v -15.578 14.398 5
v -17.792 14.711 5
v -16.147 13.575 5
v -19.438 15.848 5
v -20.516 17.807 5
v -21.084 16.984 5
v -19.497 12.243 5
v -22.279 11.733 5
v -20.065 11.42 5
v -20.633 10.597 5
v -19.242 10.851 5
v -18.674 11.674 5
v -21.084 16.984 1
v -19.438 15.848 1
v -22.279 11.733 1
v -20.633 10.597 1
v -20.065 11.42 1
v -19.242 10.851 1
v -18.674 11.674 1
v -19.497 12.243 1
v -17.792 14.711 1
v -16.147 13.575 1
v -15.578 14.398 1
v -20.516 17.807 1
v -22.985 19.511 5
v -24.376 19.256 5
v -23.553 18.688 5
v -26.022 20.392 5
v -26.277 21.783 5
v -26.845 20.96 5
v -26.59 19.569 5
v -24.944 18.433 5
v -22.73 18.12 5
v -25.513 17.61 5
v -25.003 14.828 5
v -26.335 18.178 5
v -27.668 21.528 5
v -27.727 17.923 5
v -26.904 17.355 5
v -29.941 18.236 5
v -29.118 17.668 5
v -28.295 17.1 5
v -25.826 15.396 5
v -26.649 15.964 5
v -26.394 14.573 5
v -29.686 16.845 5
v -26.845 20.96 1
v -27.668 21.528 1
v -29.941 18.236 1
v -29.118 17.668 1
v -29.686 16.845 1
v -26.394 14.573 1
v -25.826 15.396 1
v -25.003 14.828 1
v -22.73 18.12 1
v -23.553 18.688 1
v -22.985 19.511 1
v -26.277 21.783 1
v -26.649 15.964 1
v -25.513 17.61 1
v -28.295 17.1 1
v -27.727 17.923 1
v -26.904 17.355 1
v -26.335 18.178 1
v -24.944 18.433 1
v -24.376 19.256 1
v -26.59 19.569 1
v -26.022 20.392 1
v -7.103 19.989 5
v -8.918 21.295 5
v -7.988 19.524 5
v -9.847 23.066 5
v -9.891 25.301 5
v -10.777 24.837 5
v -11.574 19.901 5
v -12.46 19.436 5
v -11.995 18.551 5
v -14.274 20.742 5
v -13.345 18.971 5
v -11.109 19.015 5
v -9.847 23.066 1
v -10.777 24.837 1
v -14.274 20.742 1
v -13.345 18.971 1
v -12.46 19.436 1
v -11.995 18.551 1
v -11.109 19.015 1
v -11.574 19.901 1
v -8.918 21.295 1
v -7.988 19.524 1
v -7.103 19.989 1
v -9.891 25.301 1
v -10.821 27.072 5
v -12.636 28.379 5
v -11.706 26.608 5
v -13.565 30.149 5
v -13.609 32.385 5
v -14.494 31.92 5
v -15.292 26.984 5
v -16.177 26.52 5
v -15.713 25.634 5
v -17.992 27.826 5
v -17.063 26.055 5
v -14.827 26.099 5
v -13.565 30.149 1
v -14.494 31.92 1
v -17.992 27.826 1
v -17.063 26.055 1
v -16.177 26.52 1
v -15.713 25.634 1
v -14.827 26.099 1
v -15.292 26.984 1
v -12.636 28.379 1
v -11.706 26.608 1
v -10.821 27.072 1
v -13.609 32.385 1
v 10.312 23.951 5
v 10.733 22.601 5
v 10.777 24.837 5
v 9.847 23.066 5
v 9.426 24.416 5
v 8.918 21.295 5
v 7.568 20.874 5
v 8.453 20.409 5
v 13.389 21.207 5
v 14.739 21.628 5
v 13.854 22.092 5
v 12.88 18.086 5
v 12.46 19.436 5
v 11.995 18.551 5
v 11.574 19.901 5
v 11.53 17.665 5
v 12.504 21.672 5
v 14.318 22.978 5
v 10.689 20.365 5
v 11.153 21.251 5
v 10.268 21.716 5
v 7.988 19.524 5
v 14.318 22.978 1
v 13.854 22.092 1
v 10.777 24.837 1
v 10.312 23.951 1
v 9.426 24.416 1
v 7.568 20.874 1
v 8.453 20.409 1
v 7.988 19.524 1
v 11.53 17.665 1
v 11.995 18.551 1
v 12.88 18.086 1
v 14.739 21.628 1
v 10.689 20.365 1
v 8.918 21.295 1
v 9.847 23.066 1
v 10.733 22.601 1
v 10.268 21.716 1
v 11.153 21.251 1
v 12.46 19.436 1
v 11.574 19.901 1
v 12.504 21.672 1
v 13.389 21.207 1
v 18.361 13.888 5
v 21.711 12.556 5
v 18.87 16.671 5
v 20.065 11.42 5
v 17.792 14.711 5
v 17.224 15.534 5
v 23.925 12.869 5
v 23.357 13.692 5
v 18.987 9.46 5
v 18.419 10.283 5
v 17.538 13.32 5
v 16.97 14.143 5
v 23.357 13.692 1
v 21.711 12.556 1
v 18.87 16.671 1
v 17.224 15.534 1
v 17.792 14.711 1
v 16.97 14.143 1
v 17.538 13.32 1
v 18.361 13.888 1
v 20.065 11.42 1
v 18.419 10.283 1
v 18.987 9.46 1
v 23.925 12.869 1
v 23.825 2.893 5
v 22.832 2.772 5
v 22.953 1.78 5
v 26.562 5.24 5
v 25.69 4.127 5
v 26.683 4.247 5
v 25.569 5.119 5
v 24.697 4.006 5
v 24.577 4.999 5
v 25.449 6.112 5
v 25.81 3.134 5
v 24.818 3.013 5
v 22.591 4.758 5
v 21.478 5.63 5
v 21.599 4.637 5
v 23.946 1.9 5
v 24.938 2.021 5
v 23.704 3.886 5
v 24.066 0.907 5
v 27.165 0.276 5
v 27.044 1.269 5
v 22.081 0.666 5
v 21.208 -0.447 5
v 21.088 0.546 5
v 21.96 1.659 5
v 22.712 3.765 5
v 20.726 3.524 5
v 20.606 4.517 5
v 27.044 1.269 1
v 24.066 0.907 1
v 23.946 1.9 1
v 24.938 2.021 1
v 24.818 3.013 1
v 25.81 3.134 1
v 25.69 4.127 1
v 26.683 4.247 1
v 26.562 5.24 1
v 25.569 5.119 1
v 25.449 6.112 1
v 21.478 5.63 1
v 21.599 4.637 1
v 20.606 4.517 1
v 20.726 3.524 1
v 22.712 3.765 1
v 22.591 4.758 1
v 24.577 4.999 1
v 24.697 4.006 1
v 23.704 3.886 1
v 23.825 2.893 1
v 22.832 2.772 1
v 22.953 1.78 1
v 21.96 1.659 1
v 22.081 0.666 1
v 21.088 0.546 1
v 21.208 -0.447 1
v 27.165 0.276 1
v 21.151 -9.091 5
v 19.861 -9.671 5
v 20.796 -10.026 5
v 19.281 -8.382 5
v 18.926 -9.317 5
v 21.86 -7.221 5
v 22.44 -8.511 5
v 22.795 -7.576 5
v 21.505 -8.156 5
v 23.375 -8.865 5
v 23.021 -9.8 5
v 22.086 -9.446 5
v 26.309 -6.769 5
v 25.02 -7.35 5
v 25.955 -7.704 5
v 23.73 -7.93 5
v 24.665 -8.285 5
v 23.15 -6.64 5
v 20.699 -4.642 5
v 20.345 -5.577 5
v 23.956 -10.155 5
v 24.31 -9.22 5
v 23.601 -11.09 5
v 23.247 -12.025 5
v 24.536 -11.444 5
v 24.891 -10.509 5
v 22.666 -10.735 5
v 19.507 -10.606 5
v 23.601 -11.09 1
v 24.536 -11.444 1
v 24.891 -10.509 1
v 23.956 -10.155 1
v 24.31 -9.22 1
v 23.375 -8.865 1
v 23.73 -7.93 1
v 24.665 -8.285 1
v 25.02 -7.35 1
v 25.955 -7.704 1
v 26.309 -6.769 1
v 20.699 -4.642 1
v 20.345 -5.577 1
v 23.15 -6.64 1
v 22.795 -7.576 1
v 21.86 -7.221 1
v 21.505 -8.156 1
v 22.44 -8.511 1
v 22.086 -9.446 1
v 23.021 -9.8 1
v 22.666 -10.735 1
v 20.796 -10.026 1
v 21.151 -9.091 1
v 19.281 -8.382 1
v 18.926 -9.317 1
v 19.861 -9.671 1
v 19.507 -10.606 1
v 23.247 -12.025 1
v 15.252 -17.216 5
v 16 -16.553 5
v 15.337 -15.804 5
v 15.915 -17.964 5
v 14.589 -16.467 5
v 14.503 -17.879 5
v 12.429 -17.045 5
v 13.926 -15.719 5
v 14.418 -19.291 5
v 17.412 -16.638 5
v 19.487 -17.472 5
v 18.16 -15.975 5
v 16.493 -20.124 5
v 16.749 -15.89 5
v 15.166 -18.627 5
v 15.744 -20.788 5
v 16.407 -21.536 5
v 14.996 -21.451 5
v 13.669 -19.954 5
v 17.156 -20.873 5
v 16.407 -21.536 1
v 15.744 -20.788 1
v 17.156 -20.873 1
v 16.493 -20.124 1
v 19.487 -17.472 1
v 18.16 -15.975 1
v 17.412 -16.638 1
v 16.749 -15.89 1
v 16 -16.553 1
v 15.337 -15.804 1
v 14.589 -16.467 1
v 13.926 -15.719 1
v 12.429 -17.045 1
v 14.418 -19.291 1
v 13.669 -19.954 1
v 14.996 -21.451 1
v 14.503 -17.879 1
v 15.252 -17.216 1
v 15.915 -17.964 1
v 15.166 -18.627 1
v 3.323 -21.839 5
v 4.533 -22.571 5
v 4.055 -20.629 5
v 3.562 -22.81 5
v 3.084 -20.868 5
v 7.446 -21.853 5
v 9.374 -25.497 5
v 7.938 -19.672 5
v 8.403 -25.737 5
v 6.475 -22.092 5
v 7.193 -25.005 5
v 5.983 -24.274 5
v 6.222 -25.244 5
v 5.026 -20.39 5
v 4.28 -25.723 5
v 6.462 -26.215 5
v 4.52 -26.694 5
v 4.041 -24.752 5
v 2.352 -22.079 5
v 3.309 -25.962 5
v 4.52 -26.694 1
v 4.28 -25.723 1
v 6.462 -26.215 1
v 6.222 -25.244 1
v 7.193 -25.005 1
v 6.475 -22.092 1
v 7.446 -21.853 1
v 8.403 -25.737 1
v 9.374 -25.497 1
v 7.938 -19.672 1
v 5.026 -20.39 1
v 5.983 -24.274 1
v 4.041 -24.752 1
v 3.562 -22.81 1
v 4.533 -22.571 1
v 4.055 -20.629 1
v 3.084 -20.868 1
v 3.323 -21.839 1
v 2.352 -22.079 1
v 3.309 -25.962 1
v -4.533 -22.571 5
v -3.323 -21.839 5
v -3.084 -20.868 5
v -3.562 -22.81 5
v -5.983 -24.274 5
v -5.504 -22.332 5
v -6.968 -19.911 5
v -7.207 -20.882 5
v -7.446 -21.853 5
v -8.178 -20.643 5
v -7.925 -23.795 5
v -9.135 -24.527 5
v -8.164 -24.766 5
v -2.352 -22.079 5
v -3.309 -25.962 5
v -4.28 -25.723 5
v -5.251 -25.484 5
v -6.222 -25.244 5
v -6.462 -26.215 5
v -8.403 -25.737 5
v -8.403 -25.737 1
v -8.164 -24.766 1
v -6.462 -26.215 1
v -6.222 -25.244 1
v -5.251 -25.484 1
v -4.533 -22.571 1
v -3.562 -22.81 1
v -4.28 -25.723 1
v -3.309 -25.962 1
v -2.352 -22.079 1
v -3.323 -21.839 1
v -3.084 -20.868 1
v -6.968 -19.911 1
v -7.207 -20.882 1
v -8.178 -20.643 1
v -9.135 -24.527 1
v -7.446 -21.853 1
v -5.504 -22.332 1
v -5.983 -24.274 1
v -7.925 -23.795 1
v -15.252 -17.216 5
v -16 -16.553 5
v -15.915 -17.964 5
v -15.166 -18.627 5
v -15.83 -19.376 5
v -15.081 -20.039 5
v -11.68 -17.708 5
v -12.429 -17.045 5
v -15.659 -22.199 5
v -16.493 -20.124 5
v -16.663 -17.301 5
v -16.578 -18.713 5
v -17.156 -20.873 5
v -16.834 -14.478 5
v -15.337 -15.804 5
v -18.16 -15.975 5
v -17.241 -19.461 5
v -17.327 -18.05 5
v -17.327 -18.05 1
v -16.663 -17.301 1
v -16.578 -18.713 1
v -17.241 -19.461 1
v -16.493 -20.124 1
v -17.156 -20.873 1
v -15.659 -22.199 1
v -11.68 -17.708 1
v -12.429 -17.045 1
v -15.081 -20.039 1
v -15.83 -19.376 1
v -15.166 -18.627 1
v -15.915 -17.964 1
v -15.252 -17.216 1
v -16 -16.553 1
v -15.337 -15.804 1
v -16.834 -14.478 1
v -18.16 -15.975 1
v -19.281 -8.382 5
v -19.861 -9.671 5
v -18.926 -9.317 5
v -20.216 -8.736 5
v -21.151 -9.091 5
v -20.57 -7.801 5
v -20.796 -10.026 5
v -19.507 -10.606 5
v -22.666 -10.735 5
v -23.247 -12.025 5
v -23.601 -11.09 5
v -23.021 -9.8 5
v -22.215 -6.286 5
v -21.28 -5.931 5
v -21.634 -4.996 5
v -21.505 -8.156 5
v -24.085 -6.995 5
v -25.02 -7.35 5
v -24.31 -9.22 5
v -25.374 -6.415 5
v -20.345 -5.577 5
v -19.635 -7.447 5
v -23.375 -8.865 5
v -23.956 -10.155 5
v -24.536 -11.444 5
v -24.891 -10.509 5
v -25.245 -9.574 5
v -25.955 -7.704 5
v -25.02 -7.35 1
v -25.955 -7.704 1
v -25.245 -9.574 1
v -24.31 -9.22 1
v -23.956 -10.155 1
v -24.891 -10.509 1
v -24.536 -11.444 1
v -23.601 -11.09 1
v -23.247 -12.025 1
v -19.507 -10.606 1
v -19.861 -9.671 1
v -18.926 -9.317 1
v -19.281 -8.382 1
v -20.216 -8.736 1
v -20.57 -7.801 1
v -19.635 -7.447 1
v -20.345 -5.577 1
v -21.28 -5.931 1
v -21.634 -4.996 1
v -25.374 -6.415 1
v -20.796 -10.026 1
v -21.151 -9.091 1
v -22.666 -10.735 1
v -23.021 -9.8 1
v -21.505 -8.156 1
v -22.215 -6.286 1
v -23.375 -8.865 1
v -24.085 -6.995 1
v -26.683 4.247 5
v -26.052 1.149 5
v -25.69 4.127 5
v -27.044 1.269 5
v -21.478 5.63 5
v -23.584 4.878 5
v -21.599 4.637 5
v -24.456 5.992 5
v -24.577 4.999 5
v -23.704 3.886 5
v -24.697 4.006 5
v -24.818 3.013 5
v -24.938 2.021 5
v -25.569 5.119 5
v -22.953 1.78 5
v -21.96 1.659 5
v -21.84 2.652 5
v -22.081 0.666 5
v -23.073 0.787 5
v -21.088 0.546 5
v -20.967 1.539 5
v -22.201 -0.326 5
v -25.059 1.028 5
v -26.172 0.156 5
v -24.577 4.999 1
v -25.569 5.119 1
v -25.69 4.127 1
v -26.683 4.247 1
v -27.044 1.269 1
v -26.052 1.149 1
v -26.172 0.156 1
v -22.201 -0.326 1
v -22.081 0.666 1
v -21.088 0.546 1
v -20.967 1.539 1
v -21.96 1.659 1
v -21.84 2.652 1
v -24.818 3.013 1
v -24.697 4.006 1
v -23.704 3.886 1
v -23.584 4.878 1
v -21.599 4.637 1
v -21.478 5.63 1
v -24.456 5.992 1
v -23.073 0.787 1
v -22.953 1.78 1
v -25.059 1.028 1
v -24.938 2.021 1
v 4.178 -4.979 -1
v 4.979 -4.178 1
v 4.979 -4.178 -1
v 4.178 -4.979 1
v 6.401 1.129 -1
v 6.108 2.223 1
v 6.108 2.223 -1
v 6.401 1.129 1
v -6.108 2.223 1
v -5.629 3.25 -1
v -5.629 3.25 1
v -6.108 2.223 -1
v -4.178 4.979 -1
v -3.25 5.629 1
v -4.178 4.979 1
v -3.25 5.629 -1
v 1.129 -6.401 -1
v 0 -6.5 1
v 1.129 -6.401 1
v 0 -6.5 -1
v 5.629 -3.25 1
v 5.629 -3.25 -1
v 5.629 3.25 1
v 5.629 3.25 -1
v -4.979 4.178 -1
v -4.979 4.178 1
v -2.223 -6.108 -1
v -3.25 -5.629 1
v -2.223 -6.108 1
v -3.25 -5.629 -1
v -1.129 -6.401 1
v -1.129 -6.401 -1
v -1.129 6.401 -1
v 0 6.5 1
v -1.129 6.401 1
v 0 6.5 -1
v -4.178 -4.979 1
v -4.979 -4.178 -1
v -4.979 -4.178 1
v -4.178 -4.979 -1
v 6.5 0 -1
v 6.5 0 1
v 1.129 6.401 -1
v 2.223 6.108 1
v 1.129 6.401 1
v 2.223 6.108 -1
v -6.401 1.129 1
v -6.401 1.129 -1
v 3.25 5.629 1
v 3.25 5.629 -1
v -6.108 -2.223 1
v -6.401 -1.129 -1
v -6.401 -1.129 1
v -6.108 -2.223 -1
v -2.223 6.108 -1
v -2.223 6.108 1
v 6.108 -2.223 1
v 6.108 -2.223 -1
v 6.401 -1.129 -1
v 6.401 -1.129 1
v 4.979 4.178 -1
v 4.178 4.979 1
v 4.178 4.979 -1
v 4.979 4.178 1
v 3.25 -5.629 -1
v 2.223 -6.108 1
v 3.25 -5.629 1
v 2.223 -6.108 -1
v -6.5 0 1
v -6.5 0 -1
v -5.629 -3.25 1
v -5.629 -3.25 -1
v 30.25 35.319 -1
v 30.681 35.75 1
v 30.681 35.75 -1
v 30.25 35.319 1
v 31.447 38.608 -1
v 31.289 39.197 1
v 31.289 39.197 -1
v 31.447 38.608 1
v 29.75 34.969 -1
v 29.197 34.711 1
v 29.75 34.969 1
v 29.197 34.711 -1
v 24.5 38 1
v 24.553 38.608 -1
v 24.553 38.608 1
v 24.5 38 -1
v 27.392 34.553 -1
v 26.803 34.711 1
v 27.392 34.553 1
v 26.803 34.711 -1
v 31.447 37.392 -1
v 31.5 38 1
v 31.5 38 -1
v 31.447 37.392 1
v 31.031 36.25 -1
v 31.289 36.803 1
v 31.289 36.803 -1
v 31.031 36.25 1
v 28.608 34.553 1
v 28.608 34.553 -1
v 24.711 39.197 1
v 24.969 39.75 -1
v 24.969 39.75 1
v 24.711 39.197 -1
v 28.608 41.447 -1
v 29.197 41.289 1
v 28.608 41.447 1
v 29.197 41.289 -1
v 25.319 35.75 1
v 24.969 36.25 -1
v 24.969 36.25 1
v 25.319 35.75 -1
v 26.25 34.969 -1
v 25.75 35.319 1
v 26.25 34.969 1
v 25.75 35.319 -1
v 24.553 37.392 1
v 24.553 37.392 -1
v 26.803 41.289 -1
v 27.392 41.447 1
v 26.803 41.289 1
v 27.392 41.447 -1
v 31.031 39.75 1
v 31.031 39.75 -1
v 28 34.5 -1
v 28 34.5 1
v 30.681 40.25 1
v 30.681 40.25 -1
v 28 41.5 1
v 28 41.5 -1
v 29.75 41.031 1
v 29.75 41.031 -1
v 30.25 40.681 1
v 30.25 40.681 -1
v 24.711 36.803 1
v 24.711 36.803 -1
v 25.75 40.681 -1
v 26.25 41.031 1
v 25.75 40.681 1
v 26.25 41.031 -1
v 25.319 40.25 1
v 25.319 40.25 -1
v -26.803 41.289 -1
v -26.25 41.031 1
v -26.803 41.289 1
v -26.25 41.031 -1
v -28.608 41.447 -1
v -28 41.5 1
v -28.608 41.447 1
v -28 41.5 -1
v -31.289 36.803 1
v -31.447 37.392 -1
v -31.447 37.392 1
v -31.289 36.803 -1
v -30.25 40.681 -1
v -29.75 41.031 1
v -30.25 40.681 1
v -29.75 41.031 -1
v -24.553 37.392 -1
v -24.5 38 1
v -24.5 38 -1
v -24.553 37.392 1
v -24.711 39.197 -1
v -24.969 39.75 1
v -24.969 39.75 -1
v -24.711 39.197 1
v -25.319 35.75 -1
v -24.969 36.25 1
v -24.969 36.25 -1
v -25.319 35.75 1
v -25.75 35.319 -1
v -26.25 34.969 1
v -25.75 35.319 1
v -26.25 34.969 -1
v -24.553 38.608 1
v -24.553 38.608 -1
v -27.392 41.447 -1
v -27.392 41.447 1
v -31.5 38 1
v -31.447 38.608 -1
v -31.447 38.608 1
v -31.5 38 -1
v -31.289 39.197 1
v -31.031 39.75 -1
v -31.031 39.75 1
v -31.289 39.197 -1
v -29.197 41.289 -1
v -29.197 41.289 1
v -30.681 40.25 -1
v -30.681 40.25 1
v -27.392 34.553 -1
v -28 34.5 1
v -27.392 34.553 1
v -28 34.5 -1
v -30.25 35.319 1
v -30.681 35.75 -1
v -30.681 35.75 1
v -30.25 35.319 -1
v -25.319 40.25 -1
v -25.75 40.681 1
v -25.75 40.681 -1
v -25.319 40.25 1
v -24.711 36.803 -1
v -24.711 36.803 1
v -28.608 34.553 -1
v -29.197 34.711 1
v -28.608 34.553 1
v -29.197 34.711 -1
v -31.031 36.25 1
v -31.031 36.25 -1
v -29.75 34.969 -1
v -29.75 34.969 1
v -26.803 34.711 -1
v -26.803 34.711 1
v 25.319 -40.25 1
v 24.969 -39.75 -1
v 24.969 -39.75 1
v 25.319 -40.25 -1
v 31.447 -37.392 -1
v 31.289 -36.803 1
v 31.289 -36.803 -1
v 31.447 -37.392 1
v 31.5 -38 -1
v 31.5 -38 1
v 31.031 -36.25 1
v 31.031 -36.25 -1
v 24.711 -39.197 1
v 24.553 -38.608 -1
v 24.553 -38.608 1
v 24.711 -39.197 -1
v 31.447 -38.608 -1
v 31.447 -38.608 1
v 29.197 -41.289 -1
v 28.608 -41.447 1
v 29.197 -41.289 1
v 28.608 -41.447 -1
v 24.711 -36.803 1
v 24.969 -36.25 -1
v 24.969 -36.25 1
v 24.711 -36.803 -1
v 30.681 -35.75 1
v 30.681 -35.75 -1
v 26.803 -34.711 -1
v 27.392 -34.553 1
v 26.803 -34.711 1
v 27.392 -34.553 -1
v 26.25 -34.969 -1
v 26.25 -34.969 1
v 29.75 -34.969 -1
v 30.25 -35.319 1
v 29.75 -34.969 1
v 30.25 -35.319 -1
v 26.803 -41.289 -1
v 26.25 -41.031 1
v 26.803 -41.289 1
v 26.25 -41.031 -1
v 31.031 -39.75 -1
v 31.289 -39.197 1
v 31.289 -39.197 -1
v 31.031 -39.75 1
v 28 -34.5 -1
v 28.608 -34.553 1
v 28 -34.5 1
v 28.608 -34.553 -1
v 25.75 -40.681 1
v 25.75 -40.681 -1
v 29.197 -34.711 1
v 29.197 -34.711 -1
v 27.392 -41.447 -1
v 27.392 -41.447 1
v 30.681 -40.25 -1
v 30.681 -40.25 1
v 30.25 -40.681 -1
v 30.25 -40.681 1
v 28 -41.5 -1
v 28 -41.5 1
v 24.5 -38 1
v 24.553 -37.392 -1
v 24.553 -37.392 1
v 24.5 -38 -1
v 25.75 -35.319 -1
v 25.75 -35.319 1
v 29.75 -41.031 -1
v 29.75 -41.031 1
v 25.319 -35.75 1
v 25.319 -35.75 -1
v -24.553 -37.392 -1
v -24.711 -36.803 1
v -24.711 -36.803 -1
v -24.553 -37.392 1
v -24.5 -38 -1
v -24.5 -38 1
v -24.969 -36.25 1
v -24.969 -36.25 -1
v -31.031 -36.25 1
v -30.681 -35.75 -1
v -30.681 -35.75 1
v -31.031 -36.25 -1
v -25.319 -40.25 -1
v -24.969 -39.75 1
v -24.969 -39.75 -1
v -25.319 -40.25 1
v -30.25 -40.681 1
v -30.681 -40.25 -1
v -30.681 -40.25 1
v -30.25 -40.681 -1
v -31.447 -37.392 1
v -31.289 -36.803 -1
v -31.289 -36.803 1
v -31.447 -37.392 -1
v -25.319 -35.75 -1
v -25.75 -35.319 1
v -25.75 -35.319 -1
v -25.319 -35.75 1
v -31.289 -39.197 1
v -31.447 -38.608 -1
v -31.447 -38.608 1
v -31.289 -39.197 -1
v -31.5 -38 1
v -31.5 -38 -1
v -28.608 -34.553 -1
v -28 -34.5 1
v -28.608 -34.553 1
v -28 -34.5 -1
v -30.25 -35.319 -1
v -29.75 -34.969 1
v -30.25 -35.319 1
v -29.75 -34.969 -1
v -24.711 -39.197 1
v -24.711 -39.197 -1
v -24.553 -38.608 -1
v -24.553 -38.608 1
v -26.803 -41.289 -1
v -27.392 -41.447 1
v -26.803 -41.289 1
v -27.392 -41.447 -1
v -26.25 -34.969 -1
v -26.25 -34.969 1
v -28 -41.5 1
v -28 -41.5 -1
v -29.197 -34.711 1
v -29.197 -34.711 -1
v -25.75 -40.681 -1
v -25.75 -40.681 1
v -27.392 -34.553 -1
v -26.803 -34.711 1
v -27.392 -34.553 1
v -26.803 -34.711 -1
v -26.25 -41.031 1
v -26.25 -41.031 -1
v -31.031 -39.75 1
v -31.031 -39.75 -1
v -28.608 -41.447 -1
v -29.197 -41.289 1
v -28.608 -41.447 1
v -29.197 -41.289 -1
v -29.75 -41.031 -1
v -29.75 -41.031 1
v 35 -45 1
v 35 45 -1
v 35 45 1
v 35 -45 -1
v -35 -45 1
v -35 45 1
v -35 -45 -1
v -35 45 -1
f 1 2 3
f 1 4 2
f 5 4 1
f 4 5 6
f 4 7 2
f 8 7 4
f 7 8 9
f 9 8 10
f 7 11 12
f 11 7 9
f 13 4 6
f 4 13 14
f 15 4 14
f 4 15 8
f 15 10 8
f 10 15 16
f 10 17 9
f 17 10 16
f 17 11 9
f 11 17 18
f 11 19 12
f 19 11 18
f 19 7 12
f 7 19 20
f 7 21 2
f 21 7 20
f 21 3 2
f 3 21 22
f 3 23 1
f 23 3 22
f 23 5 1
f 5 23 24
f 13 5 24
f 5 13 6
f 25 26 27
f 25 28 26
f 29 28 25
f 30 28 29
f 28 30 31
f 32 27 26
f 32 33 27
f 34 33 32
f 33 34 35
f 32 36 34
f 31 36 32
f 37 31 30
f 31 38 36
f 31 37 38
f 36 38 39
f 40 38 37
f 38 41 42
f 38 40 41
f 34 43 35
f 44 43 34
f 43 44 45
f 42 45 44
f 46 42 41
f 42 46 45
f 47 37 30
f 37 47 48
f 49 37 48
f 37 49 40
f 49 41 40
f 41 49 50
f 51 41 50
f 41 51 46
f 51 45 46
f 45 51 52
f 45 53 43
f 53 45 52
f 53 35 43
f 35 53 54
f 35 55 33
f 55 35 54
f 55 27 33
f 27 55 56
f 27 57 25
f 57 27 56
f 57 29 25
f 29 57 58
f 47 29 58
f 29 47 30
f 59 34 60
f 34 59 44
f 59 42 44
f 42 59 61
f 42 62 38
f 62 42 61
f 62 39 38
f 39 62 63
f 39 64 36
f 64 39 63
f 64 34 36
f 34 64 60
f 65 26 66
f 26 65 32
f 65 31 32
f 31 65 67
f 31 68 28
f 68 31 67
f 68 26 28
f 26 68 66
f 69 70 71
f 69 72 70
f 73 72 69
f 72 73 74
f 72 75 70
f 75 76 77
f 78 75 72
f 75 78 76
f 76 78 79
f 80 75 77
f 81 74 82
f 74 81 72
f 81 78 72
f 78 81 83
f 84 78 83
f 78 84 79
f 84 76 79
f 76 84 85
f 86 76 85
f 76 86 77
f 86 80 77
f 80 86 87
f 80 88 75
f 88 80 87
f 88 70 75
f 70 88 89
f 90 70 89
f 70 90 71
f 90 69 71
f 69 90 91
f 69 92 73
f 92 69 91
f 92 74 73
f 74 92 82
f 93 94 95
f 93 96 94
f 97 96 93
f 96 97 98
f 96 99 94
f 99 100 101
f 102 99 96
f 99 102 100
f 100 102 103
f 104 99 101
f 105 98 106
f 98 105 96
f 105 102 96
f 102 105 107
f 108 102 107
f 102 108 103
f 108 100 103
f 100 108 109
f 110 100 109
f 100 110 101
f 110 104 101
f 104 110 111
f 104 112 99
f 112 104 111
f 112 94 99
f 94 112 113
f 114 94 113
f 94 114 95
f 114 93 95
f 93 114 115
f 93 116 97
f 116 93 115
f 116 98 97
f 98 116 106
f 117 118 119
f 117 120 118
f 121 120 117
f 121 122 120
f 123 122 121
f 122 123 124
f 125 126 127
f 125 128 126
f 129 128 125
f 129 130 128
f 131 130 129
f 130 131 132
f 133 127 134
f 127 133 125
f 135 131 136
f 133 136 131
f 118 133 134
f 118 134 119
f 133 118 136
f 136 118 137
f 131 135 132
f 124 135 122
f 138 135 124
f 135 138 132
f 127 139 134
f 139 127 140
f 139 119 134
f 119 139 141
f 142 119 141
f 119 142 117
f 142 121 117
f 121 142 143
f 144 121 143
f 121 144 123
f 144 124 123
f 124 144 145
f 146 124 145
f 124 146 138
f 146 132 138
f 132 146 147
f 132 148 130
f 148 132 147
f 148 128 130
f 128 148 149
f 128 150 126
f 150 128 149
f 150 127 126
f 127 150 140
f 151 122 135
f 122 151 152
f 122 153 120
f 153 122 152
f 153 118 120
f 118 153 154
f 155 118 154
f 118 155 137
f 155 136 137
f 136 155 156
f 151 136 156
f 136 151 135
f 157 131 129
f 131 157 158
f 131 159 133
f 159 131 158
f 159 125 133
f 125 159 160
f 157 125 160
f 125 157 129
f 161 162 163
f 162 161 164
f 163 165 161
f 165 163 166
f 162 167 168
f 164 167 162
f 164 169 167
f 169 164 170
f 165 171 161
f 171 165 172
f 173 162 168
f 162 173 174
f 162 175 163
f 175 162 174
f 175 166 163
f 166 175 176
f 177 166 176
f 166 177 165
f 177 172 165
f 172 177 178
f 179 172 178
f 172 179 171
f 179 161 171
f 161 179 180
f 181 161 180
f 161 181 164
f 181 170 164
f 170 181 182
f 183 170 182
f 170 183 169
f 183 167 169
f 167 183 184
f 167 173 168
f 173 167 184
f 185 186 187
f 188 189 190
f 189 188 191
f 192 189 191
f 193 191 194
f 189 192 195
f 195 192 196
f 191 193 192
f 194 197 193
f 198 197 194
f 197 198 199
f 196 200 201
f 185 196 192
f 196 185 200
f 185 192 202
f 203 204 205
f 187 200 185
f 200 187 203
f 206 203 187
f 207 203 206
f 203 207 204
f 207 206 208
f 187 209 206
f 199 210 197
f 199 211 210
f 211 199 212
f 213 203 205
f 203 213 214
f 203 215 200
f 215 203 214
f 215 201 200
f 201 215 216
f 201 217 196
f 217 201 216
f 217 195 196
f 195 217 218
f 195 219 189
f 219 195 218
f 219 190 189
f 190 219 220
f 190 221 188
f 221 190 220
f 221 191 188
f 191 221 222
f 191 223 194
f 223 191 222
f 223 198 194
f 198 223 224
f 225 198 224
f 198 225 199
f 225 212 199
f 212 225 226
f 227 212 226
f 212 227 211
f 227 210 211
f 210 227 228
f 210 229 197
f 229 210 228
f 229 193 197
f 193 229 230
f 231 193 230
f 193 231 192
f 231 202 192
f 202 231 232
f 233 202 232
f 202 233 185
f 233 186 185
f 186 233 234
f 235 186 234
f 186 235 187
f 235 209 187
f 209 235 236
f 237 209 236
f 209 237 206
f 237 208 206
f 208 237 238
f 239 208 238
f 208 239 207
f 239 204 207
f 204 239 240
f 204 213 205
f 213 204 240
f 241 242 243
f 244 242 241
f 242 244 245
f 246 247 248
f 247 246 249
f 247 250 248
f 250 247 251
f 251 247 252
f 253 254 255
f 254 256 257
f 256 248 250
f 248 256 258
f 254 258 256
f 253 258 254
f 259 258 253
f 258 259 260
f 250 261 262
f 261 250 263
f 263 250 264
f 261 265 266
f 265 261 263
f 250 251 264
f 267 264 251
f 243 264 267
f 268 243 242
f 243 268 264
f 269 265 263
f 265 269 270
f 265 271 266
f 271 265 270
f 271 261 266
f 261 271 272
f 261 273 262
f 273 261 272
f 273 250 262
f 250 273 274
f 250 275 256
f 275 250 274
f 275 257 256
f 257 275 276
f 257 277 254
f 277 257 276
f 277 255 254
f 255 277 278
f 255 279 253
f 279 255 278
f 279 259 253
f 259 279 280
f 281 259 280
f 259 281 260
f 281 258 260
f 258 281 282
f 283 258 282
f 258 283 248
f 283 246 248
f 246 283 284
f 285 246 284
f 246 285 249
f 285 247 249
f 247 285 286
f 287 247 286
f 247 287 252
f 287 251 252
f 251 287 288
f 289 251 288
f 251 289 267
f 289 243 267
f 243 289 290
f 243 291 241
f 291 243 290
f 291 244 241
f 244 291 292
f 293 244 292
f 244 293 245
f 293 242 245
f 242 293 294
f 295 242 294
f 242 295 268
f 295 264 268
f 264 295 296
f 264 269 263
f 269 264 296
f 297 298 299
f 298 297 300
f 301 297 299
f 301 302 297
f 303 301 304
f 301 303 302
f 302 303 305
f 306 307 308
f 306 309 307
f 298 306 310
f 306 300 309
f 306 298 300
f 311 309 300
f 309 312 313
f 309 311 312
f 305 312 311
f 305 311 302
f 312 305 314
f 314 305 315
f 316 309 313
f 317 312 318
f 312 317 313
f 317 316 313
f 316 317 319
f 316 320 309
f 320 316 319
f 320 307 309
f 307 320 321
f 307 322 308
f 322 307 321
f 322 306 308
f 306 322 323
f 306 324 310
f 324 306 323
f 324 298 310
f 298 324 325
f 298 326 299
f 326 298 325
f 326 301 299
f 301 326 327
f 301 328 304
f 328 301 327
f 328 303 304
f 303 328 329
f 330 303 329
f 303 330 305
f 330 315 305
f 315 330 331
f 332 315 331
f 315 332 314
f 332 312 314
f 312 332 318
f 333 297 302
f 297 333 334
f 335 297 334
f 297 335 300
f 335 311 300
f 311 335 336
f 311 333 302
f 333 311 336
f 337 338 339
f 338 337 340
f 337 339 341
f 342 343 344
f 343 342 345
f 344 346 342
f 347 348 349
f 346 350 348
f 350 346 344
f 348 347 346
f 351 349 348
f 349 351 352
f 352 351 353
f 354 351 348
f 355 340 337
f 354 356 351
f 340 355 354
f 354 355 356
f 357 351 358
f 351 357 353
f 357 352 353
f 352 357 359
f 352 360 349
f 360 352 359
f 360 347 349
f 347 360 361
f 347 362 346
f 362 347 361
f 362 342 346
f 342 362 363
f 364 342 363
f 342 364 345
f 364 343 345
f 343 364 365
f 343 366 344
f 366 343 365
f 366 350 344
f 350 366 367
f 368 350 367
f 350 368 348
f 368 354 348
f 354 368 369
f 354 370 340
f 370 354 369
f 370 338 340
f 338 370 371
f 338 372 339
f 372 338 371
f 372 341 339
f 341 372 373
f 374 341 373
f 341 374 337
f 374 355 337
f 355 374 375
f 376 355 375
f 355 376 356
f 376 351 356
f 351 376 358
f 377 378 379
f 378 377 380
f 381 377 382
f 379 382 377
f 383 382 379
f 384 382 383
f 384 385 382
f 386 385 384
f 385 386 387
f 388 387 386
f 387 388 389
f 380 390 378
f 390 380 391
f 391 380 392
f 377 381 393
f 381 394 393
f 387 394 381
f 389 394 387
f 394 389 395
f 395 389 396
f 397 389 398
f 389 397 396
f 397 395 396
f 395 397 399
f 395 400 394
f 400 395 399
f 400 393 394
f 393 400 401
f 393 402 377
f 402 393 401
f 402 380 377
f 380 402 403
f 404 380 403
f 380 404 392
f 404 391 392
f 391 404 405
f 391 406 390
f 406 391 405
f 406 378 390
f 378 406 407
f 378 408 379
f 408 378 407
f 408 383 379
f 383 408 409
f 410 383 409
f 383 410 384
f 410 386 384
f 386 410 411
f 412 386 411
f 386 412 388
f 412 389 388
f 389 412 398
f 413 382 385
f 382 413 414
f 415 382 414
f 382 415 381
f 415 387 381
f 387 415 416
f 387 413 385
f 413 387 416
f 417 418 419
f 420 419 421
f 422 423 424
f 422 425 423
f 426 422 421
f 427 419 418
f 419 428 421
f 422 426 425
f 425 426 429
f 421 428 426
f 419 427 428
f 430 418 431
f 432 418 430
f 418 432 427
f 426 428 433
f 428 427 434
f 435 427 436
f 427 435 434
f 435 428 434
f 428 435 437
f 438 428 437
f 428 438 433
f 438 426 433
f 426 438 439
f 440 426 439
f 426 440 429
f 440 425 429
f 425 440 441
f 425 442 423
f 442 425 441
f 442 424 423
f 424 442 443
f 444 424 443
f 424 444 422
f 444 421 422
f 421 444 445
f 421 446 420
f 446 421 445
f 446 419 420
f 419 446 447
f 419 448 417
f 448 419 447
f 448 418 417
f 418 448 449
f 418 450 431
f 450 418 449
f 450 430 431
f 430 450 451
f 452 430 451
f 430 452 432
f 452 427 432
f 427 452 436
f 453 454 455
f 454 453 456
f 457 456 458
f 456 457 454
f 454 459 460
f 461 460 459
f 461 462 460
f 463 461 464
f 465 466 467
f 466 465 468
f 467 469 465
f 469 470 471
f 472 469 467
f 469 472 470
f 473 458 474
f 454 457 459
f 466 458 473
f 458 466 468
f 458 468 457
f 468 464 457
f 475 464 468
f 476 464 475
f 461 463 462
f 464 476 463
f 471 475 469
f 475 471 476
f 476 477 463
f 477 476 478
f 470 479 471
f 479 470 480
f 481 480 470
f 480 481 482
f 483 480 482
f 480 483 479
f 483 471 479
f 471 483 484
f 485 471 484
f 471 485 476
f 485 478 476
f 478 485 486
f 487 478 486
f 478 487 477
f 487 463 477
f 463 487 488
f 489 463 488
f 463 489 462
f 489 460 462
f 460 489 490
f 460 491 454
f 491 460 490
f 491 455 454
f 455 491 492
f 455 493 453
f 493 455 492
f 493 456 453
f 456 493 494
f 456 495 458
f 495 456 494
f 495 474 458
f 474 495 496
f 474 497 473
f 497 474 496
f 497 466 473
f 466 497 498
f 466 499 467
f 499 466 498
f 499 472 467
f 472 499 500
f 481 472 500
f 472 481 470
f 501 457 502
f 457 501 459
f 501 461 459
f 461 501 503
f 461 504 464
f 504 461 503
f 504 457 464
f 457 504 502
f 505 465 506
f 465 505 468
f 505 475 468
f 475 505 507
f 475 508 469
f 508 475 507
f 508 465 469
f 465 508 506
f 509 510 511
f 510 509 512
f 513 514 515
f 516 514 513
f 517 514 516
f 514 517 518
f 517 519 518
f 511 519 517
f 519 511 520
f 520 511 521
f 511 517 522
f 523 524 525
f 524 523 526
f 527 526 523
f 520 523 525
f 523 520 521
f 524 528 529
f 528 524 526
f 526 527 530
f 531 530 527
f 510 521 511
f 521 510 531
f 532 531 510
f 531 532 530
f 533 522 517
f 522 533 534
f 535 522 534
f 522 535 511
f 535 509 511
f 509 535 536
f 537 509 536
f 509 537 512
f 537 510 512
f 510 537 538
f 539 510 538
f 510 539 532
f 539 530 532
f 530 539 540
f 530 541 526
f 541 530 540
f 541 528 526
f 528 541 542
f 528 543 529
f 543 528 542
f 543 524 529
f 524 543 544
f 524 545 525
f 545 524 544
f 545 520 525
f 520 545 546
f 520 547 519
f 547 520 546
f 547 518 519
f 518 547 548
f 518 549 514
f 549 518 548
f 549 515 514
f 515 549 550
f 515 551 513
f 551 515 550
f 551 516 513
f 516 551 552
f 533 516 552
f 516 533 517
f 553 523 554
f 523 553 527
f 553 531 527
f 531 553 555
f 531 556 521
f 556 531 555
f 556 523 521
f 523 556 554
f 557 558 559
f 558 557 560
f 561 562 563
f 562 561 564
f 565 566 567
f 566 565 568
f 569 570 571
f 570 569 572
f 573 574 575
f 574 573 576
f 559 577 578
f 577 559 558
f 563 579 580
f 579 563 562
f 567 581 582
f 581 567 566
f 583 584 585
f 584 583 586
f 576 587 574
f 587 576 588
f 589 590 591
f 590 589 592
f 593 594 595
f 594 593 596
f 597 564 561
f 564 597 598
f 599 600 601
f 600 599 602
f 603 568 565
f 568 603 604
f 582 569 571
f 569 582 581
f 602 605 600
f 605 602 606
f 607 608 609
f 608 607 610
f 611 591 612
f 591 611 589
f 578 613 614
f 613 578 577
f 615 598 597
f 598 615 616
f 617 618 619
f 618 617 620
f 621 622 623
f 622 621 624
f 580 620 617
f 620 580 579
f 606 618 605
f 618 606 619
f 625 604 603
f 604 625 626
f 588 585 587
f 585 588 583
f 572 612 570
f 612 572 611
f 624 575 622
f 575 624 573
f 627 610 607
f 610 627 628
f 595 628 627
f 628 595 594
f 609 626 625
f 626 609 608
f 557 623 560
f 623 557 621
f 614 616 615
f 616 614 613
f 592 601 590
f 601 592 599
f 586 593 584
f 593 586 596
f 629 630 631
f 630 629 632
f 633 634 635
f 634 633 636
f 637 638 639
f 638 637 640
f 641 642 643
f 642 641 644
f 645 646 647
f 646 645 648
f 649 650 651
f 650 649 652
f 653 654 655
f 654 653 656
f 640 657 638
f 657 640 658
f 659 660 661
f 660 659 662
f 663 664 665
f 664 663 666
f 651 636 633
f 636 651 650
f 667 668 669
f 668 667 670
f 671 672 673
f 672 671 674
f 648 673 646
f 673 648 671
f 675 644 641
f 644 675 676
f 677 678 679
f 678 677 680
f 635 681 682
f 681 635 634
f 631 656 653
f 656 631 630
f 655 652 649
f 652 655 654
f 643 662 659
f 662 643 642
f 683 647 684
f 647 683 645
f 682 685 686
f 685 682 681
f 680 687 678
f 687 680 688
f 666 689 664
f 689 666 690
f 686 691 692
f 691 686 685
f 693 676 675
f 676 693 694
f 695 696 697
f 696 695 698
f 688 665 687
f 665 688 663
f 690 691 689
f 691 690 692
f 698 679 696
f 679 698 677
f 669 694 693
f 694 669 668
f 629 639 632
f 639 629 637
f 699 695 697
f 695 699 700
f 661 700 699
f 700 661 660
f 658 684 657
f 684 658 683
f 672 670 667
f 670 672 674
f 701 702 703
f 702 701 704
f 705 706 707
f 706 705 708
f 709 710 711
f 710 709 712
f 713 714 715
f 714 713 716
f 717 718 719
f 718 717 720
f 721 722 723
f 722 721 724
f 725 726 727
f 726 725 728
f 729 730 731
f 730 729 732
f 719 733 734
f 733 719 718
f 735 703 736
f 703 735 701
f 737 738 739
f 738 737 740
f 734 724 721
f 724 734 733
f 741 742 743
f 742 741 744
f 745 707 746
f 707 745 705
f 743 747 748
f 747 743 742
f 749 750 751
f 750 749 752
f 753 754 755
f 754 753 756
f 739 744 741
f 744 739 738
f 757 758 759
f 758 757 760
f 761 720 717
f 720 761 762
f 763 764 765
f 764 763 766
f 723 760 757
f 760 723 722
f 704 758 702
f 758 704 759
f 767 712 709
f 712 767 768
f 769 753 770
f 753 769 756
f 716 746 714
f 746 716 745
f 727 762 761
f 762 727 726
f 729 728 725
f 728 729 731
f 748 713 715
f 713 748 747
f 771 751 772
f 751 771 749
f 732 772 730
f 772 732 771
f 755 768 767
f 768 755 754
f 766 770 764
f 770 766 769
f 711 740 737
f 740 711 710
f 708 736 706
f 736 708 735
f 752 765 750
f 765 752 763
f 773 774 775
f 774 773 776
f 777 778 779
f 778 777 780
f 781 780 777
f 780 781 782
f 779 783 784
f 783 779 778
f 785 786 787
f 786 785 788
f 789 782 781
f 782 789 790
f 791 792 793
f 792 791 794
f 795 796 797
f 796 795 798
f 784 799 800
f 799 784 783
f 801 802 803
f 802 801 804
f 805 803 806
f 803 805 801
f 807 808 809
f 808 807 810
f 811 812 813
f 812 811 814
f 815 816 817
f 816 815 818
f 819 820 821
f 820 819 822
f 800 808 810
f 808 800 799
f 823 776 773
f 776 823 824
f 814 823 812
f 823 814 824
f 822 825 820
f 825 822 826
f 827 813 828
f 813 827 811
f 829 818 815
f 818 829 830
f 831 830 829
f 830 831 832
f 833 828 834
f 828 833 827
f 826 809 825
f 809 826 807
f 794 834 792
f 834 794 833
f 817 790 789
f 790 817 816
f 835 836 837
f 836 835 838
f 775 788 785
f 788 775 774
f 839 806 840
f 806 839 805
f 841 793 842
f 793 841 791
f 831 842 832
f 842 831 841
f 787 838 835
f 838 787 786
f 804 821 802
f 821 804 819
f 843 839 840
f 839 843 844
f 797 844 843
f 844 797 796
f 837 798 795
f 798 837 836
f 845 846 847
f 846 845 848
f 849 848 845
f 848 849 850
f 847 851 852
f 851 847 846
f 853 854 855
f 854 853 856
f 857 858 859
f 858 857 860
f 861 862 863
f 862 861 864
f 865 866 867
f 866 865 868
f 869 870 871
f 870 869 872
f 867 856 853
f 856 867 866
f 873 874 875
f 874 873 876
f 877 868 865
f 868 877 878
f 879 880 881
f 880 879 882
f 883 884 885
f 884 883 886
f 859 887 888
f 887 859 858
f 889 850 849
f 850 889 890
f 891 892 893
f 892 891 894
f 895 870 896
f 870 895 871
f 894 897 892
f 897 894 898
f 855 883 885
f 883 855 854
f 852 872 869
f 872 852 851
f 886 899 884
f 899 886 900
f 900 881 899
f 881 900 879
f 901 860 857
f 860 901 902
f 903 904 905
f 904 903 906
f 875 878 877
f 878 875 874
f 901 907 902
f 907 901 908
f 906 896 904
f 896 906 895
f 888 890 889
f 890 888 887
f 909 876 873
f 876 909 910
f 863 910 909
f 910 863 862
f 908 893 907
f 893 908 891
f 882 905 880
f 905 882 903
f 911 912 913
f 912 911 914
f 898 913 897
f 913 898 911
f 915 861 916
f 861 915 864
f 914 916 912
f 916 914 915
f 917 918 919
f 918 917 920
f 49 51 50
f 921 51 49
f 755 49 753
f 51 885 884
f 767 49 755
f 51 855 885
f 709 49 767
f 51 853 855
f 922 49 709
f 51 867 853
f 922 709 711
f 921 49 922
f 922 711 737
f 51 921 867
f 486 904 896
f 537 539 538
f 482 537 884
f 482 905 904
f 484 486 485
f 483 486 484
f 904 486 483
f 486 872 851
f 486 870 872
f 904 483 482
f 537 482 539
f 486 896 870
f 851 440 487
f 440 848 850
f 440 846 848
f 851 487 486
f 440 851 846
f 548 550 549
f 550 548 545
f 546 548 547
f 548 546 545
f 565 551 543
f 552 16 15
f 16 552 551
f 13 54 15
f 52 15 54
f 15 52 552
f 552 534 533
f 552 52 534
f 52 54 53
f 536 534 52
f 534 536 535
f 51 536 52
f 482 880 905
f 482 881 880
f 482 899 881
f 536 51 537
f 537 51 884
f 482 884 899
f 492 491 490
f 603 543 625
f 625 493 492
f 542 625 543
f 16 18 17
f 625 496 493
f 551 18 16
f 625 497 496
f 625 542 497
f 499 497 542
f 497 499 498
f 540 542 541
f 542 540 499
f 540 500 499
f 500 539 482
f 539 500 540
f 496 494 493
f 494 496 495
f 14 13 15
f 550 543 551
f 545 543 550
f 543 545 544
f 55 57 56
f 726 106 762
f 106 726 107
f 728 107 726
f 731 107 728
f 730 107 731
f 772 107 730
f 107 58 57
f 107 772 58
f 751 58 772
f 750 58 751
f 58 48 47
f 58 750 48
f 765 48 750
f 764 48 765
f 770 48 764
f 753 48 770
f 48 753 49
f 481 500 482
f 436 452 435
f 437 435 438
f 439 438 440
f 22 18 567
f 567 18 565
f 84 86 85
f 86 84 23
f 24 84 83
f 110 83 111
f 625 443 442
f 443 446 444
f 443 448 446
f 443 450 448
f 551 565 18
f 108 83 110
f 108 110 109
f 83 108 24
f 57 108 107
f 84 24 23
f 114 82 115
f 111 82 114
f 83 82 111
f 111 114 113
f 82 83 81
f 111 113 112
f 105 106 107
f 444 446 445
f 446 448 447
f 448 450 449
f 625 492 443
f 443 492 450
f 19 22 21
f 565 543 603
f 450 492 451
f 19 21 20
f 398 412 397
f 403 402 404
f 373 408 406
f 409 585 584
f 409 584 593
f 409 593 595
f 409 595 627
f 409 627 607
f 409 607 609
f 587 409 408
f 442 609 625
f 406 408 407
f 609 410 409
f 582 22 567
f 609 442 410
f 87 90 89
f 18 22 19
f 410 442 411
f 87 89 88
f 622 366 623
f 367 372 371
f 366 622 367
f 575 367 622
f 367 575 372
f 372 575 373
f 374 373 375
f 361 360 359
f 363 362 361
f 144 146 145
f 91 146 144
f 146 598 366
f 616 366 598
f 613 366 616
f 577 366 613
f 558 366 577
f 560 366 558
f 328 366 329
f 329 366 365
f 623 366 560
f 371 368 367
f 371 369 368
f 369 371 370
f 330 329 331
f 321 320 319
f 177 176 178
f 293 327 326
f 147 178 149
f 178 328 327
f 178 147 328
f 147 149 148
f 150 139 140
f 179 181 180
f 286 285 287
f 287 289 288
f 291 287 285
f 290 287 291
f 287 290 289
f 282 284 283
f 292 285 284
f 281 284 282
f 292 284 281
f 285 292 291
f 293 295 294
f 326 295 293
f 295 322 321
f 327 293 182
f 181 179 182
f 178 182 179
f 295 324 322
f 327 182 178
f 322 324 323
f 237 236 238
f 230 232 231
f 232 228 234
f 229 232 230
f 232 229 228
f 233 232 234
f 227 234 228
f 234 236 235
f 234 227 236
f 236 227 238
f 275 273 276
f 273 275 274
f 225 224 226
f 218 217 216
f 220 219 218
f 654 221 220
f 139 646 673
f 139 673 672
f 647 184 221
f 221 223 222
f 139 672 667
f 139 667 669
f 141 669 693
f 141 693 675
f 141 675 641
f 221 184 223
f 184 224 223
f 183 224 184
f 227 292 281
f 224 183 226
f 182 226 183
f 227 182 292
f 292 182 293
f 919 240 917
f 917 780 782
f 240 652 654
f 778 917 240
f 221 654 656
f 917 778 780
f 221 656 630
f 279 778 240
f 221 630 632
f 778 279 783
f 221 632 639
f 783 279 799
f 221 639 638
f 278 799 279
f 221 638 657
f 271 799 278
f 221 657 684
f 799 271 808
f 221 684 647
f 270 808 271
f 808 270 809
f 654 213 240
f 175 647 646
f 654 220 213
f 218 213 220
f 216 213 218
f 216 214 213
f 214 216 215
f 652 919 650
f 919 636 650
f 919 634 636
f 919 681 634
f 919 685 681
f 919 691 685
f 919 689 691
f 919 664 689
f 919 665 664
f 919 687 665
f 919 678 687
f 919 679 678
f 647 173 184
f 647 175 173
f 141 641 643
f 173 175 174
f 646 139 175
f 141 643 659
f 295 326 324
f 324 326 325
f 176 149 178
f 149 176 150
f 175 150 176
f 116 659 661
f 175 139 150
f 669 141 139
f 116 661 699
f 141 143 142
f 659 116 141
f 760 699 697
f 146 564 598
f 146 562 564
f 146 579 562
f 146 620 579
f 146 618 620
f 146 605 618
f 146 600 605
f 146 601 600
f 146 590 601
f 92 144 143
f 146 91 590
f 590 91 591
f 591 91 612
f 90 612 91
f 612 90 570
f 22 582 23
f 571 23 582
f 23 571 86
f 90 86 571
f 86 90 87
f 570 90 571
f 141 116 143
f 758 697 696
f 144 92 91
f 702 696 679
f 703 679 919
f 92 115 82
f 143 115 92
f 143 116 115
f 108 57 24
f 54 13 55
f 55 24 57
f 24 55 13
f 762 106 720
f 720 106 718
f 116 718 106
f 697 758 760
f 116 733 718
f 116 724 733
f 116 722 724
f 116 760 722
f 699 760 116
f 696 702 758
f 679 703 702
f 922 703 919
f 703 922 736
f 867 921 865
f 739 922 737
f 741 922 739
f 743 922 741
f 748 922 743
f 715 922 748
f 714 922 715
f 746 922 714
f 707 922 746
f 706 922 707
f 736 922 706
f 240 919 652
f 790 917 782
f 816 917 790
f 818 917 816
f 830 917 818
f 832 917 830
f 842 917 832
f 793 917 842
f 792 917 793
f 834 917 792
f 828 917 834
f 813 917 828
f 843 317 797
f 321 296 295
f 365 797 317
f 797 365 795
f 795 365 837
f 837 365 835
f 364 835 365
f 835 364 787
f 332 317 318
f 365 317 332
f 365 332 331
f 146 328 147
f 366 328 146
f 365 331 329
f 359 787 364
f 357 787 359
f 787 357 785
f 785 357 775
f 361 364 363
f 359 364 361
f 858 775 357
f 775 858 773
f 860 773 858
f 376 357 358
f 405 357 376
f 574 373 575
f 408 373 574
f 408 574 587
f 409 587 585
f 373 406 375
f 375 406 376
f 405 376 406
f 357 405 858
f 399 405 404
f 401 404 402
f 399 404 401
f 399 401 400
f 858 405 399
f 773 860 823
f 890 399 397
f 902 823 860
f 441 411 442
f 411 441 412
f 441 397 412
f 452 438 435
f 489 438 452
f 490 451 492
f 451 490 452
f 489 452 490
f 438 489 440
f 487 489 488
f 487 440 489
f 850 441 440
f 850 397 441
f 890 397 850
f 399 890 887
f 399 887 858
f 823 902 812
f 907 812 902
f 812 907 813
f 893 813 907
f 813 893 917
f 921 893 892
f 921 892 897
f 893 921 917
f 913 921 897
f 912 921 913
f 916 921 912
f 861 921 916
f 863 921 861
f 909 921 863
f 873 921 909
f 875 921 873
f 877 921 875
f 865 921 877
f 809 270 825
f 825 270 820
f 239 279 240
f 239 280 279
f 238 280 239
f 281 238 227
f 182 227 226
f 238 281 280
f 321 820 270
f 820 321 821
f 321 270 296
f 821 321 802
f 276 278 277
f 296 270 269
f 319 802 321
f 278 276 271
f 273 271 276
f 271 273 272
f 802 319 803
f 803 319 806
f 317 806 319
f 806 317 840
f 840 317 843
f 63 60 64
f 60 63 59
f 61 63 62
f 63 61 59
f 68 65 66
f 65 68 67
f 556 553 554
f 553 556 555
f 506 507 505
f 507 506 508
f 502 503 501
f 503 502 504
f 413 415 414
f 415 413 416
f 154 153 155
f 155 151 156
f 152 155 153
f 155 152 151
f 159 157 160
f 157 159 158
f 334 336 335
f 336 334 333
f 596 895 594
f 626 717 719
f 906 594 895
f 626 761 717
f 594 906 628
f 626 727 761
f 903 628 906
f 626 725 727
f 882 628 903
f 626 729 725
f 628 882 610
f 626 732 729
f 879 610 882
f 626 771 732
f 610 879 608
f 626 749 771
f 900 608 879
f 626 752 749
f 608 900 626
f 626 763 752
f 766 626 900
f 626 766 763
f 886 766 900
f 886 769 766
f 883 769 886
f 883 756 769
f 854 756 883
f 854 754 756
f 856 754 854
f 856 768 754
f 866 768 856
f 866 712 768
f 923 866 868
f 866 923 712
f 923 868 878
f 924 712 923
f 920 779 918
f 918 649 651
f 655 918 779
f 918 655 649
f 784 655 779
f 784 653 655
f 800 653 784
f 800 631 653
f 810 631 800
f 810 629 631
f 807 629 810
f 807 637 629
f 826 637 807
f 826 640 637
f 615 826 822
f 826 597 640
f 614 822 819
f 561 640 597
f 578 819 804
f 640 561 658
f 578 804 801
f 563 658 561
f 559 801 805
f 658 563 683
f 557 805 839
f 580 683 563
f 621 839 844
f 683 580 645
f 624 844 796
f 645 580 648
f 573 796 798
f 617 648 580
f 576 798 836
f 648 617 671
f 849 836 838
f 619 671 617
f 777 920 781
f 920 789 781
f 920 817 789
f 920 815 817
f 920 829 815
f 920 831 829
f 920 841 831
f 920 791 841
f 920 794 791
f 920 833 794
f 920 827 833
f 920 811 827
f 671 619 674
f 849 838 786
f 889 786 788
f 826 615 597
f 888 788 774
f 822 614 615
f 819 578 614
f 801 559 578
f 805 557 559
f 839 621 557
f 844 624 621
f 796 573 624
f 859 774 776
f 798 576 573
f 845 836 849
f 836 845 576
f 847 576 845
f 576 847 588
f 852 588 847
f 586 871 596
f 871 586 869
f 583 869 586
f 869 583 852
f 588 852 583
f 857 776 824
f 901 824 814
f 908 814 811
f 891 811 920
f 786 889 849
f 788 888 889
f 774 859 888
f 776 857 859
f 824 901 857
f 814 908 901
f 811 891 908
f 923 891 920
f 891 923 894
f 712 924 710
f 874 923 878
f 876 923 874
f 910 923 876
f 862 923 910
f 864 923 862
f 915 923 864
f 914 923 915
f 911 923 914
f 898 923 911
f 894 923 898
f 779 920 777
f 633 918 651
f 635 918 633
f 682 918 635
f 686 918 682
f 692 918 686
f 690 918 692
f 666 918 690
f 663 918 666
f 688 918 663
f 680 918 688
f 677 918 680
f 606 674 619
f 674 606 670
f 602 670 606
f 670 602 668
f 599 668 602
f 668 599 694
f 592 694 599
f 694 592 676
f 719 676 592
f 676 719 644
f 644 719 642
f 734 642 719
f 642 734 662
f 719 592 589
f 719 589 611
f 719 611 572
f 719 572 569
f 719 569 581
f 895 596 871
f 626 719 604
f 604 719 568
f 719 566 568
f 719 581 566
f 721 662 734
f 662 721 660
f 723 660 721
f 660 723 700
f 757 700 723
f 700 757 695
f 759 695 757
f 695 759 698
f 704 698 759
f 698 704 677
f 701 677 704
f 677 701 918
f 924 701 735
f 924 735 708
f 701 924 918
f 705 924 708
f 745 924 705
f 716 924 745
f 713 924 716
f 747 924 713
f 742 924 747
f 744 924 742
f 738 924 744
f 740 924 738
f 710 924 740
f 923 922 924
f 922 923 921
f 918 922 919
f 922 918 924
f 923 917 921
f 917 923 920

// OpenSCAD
//---------------------------------------------------------------------------------------------
//-- Print of OpenBeam
//-- (c) Martin Korinek	m.ko@inode.at
//-- April-2015
//---------------------------------------------------------------------------------------------
//--
//---------------------------------------------------------------------------------------------

use <MCAD/fonts.scad>

thisFont=8bit_polyfont();
x_shift=thisFont[0][0];
y_shift=thisFont[0][1];

hours=["0","1","2","3","4","5","6","7","8","9","10","11",""];

//fragment minimum angle
  $fa=10.0;

//fragment minimum size
  $fs=0.2;
  
  extr_heigth=20;



// Example combining MCAD/fonts.scad with search() function.



module clock_hour_words(word_offset=20.0,word_height=2.0) {
  for(i=[0:(len(hours)-1)]) assign( hourHandAngle=(i+1)*360/len(hours), theseIndicies=search(hours[i],thisFont[2],1,1) ) {
    rotate(90-hourHandAngle) translate([word_offset,0])
      for( j=[0:(len(theseIndicies)-1)] ) translate([j*x_shift,-y_shift/2]) {
        linear_extrude(height=word_height) polygon(points=thisFont[2][theseIndicies[j]][6][0],paths=thisFont[2][theseIndicies[j]][6][1]);
      }
  }
}

clock_hour_words(word_offset=20.0,word_height=5.0);

difference()
{
	cube([70,90,2],center = true);
	translate([0,0,-2])
	{
		cylinder(d = 13, h = 5);
			translate([28,38,0])
				cylinder(d = 7, h = 5);
			translate([-28,38,0])
				cylinder(d = 7, h = 5);
			translate([28,-38,0])
				cylinder(d = 7, h = 5);
			translate([-28,-38,0])
				cylinder(d = 7, h = 5);
	}
	
}
